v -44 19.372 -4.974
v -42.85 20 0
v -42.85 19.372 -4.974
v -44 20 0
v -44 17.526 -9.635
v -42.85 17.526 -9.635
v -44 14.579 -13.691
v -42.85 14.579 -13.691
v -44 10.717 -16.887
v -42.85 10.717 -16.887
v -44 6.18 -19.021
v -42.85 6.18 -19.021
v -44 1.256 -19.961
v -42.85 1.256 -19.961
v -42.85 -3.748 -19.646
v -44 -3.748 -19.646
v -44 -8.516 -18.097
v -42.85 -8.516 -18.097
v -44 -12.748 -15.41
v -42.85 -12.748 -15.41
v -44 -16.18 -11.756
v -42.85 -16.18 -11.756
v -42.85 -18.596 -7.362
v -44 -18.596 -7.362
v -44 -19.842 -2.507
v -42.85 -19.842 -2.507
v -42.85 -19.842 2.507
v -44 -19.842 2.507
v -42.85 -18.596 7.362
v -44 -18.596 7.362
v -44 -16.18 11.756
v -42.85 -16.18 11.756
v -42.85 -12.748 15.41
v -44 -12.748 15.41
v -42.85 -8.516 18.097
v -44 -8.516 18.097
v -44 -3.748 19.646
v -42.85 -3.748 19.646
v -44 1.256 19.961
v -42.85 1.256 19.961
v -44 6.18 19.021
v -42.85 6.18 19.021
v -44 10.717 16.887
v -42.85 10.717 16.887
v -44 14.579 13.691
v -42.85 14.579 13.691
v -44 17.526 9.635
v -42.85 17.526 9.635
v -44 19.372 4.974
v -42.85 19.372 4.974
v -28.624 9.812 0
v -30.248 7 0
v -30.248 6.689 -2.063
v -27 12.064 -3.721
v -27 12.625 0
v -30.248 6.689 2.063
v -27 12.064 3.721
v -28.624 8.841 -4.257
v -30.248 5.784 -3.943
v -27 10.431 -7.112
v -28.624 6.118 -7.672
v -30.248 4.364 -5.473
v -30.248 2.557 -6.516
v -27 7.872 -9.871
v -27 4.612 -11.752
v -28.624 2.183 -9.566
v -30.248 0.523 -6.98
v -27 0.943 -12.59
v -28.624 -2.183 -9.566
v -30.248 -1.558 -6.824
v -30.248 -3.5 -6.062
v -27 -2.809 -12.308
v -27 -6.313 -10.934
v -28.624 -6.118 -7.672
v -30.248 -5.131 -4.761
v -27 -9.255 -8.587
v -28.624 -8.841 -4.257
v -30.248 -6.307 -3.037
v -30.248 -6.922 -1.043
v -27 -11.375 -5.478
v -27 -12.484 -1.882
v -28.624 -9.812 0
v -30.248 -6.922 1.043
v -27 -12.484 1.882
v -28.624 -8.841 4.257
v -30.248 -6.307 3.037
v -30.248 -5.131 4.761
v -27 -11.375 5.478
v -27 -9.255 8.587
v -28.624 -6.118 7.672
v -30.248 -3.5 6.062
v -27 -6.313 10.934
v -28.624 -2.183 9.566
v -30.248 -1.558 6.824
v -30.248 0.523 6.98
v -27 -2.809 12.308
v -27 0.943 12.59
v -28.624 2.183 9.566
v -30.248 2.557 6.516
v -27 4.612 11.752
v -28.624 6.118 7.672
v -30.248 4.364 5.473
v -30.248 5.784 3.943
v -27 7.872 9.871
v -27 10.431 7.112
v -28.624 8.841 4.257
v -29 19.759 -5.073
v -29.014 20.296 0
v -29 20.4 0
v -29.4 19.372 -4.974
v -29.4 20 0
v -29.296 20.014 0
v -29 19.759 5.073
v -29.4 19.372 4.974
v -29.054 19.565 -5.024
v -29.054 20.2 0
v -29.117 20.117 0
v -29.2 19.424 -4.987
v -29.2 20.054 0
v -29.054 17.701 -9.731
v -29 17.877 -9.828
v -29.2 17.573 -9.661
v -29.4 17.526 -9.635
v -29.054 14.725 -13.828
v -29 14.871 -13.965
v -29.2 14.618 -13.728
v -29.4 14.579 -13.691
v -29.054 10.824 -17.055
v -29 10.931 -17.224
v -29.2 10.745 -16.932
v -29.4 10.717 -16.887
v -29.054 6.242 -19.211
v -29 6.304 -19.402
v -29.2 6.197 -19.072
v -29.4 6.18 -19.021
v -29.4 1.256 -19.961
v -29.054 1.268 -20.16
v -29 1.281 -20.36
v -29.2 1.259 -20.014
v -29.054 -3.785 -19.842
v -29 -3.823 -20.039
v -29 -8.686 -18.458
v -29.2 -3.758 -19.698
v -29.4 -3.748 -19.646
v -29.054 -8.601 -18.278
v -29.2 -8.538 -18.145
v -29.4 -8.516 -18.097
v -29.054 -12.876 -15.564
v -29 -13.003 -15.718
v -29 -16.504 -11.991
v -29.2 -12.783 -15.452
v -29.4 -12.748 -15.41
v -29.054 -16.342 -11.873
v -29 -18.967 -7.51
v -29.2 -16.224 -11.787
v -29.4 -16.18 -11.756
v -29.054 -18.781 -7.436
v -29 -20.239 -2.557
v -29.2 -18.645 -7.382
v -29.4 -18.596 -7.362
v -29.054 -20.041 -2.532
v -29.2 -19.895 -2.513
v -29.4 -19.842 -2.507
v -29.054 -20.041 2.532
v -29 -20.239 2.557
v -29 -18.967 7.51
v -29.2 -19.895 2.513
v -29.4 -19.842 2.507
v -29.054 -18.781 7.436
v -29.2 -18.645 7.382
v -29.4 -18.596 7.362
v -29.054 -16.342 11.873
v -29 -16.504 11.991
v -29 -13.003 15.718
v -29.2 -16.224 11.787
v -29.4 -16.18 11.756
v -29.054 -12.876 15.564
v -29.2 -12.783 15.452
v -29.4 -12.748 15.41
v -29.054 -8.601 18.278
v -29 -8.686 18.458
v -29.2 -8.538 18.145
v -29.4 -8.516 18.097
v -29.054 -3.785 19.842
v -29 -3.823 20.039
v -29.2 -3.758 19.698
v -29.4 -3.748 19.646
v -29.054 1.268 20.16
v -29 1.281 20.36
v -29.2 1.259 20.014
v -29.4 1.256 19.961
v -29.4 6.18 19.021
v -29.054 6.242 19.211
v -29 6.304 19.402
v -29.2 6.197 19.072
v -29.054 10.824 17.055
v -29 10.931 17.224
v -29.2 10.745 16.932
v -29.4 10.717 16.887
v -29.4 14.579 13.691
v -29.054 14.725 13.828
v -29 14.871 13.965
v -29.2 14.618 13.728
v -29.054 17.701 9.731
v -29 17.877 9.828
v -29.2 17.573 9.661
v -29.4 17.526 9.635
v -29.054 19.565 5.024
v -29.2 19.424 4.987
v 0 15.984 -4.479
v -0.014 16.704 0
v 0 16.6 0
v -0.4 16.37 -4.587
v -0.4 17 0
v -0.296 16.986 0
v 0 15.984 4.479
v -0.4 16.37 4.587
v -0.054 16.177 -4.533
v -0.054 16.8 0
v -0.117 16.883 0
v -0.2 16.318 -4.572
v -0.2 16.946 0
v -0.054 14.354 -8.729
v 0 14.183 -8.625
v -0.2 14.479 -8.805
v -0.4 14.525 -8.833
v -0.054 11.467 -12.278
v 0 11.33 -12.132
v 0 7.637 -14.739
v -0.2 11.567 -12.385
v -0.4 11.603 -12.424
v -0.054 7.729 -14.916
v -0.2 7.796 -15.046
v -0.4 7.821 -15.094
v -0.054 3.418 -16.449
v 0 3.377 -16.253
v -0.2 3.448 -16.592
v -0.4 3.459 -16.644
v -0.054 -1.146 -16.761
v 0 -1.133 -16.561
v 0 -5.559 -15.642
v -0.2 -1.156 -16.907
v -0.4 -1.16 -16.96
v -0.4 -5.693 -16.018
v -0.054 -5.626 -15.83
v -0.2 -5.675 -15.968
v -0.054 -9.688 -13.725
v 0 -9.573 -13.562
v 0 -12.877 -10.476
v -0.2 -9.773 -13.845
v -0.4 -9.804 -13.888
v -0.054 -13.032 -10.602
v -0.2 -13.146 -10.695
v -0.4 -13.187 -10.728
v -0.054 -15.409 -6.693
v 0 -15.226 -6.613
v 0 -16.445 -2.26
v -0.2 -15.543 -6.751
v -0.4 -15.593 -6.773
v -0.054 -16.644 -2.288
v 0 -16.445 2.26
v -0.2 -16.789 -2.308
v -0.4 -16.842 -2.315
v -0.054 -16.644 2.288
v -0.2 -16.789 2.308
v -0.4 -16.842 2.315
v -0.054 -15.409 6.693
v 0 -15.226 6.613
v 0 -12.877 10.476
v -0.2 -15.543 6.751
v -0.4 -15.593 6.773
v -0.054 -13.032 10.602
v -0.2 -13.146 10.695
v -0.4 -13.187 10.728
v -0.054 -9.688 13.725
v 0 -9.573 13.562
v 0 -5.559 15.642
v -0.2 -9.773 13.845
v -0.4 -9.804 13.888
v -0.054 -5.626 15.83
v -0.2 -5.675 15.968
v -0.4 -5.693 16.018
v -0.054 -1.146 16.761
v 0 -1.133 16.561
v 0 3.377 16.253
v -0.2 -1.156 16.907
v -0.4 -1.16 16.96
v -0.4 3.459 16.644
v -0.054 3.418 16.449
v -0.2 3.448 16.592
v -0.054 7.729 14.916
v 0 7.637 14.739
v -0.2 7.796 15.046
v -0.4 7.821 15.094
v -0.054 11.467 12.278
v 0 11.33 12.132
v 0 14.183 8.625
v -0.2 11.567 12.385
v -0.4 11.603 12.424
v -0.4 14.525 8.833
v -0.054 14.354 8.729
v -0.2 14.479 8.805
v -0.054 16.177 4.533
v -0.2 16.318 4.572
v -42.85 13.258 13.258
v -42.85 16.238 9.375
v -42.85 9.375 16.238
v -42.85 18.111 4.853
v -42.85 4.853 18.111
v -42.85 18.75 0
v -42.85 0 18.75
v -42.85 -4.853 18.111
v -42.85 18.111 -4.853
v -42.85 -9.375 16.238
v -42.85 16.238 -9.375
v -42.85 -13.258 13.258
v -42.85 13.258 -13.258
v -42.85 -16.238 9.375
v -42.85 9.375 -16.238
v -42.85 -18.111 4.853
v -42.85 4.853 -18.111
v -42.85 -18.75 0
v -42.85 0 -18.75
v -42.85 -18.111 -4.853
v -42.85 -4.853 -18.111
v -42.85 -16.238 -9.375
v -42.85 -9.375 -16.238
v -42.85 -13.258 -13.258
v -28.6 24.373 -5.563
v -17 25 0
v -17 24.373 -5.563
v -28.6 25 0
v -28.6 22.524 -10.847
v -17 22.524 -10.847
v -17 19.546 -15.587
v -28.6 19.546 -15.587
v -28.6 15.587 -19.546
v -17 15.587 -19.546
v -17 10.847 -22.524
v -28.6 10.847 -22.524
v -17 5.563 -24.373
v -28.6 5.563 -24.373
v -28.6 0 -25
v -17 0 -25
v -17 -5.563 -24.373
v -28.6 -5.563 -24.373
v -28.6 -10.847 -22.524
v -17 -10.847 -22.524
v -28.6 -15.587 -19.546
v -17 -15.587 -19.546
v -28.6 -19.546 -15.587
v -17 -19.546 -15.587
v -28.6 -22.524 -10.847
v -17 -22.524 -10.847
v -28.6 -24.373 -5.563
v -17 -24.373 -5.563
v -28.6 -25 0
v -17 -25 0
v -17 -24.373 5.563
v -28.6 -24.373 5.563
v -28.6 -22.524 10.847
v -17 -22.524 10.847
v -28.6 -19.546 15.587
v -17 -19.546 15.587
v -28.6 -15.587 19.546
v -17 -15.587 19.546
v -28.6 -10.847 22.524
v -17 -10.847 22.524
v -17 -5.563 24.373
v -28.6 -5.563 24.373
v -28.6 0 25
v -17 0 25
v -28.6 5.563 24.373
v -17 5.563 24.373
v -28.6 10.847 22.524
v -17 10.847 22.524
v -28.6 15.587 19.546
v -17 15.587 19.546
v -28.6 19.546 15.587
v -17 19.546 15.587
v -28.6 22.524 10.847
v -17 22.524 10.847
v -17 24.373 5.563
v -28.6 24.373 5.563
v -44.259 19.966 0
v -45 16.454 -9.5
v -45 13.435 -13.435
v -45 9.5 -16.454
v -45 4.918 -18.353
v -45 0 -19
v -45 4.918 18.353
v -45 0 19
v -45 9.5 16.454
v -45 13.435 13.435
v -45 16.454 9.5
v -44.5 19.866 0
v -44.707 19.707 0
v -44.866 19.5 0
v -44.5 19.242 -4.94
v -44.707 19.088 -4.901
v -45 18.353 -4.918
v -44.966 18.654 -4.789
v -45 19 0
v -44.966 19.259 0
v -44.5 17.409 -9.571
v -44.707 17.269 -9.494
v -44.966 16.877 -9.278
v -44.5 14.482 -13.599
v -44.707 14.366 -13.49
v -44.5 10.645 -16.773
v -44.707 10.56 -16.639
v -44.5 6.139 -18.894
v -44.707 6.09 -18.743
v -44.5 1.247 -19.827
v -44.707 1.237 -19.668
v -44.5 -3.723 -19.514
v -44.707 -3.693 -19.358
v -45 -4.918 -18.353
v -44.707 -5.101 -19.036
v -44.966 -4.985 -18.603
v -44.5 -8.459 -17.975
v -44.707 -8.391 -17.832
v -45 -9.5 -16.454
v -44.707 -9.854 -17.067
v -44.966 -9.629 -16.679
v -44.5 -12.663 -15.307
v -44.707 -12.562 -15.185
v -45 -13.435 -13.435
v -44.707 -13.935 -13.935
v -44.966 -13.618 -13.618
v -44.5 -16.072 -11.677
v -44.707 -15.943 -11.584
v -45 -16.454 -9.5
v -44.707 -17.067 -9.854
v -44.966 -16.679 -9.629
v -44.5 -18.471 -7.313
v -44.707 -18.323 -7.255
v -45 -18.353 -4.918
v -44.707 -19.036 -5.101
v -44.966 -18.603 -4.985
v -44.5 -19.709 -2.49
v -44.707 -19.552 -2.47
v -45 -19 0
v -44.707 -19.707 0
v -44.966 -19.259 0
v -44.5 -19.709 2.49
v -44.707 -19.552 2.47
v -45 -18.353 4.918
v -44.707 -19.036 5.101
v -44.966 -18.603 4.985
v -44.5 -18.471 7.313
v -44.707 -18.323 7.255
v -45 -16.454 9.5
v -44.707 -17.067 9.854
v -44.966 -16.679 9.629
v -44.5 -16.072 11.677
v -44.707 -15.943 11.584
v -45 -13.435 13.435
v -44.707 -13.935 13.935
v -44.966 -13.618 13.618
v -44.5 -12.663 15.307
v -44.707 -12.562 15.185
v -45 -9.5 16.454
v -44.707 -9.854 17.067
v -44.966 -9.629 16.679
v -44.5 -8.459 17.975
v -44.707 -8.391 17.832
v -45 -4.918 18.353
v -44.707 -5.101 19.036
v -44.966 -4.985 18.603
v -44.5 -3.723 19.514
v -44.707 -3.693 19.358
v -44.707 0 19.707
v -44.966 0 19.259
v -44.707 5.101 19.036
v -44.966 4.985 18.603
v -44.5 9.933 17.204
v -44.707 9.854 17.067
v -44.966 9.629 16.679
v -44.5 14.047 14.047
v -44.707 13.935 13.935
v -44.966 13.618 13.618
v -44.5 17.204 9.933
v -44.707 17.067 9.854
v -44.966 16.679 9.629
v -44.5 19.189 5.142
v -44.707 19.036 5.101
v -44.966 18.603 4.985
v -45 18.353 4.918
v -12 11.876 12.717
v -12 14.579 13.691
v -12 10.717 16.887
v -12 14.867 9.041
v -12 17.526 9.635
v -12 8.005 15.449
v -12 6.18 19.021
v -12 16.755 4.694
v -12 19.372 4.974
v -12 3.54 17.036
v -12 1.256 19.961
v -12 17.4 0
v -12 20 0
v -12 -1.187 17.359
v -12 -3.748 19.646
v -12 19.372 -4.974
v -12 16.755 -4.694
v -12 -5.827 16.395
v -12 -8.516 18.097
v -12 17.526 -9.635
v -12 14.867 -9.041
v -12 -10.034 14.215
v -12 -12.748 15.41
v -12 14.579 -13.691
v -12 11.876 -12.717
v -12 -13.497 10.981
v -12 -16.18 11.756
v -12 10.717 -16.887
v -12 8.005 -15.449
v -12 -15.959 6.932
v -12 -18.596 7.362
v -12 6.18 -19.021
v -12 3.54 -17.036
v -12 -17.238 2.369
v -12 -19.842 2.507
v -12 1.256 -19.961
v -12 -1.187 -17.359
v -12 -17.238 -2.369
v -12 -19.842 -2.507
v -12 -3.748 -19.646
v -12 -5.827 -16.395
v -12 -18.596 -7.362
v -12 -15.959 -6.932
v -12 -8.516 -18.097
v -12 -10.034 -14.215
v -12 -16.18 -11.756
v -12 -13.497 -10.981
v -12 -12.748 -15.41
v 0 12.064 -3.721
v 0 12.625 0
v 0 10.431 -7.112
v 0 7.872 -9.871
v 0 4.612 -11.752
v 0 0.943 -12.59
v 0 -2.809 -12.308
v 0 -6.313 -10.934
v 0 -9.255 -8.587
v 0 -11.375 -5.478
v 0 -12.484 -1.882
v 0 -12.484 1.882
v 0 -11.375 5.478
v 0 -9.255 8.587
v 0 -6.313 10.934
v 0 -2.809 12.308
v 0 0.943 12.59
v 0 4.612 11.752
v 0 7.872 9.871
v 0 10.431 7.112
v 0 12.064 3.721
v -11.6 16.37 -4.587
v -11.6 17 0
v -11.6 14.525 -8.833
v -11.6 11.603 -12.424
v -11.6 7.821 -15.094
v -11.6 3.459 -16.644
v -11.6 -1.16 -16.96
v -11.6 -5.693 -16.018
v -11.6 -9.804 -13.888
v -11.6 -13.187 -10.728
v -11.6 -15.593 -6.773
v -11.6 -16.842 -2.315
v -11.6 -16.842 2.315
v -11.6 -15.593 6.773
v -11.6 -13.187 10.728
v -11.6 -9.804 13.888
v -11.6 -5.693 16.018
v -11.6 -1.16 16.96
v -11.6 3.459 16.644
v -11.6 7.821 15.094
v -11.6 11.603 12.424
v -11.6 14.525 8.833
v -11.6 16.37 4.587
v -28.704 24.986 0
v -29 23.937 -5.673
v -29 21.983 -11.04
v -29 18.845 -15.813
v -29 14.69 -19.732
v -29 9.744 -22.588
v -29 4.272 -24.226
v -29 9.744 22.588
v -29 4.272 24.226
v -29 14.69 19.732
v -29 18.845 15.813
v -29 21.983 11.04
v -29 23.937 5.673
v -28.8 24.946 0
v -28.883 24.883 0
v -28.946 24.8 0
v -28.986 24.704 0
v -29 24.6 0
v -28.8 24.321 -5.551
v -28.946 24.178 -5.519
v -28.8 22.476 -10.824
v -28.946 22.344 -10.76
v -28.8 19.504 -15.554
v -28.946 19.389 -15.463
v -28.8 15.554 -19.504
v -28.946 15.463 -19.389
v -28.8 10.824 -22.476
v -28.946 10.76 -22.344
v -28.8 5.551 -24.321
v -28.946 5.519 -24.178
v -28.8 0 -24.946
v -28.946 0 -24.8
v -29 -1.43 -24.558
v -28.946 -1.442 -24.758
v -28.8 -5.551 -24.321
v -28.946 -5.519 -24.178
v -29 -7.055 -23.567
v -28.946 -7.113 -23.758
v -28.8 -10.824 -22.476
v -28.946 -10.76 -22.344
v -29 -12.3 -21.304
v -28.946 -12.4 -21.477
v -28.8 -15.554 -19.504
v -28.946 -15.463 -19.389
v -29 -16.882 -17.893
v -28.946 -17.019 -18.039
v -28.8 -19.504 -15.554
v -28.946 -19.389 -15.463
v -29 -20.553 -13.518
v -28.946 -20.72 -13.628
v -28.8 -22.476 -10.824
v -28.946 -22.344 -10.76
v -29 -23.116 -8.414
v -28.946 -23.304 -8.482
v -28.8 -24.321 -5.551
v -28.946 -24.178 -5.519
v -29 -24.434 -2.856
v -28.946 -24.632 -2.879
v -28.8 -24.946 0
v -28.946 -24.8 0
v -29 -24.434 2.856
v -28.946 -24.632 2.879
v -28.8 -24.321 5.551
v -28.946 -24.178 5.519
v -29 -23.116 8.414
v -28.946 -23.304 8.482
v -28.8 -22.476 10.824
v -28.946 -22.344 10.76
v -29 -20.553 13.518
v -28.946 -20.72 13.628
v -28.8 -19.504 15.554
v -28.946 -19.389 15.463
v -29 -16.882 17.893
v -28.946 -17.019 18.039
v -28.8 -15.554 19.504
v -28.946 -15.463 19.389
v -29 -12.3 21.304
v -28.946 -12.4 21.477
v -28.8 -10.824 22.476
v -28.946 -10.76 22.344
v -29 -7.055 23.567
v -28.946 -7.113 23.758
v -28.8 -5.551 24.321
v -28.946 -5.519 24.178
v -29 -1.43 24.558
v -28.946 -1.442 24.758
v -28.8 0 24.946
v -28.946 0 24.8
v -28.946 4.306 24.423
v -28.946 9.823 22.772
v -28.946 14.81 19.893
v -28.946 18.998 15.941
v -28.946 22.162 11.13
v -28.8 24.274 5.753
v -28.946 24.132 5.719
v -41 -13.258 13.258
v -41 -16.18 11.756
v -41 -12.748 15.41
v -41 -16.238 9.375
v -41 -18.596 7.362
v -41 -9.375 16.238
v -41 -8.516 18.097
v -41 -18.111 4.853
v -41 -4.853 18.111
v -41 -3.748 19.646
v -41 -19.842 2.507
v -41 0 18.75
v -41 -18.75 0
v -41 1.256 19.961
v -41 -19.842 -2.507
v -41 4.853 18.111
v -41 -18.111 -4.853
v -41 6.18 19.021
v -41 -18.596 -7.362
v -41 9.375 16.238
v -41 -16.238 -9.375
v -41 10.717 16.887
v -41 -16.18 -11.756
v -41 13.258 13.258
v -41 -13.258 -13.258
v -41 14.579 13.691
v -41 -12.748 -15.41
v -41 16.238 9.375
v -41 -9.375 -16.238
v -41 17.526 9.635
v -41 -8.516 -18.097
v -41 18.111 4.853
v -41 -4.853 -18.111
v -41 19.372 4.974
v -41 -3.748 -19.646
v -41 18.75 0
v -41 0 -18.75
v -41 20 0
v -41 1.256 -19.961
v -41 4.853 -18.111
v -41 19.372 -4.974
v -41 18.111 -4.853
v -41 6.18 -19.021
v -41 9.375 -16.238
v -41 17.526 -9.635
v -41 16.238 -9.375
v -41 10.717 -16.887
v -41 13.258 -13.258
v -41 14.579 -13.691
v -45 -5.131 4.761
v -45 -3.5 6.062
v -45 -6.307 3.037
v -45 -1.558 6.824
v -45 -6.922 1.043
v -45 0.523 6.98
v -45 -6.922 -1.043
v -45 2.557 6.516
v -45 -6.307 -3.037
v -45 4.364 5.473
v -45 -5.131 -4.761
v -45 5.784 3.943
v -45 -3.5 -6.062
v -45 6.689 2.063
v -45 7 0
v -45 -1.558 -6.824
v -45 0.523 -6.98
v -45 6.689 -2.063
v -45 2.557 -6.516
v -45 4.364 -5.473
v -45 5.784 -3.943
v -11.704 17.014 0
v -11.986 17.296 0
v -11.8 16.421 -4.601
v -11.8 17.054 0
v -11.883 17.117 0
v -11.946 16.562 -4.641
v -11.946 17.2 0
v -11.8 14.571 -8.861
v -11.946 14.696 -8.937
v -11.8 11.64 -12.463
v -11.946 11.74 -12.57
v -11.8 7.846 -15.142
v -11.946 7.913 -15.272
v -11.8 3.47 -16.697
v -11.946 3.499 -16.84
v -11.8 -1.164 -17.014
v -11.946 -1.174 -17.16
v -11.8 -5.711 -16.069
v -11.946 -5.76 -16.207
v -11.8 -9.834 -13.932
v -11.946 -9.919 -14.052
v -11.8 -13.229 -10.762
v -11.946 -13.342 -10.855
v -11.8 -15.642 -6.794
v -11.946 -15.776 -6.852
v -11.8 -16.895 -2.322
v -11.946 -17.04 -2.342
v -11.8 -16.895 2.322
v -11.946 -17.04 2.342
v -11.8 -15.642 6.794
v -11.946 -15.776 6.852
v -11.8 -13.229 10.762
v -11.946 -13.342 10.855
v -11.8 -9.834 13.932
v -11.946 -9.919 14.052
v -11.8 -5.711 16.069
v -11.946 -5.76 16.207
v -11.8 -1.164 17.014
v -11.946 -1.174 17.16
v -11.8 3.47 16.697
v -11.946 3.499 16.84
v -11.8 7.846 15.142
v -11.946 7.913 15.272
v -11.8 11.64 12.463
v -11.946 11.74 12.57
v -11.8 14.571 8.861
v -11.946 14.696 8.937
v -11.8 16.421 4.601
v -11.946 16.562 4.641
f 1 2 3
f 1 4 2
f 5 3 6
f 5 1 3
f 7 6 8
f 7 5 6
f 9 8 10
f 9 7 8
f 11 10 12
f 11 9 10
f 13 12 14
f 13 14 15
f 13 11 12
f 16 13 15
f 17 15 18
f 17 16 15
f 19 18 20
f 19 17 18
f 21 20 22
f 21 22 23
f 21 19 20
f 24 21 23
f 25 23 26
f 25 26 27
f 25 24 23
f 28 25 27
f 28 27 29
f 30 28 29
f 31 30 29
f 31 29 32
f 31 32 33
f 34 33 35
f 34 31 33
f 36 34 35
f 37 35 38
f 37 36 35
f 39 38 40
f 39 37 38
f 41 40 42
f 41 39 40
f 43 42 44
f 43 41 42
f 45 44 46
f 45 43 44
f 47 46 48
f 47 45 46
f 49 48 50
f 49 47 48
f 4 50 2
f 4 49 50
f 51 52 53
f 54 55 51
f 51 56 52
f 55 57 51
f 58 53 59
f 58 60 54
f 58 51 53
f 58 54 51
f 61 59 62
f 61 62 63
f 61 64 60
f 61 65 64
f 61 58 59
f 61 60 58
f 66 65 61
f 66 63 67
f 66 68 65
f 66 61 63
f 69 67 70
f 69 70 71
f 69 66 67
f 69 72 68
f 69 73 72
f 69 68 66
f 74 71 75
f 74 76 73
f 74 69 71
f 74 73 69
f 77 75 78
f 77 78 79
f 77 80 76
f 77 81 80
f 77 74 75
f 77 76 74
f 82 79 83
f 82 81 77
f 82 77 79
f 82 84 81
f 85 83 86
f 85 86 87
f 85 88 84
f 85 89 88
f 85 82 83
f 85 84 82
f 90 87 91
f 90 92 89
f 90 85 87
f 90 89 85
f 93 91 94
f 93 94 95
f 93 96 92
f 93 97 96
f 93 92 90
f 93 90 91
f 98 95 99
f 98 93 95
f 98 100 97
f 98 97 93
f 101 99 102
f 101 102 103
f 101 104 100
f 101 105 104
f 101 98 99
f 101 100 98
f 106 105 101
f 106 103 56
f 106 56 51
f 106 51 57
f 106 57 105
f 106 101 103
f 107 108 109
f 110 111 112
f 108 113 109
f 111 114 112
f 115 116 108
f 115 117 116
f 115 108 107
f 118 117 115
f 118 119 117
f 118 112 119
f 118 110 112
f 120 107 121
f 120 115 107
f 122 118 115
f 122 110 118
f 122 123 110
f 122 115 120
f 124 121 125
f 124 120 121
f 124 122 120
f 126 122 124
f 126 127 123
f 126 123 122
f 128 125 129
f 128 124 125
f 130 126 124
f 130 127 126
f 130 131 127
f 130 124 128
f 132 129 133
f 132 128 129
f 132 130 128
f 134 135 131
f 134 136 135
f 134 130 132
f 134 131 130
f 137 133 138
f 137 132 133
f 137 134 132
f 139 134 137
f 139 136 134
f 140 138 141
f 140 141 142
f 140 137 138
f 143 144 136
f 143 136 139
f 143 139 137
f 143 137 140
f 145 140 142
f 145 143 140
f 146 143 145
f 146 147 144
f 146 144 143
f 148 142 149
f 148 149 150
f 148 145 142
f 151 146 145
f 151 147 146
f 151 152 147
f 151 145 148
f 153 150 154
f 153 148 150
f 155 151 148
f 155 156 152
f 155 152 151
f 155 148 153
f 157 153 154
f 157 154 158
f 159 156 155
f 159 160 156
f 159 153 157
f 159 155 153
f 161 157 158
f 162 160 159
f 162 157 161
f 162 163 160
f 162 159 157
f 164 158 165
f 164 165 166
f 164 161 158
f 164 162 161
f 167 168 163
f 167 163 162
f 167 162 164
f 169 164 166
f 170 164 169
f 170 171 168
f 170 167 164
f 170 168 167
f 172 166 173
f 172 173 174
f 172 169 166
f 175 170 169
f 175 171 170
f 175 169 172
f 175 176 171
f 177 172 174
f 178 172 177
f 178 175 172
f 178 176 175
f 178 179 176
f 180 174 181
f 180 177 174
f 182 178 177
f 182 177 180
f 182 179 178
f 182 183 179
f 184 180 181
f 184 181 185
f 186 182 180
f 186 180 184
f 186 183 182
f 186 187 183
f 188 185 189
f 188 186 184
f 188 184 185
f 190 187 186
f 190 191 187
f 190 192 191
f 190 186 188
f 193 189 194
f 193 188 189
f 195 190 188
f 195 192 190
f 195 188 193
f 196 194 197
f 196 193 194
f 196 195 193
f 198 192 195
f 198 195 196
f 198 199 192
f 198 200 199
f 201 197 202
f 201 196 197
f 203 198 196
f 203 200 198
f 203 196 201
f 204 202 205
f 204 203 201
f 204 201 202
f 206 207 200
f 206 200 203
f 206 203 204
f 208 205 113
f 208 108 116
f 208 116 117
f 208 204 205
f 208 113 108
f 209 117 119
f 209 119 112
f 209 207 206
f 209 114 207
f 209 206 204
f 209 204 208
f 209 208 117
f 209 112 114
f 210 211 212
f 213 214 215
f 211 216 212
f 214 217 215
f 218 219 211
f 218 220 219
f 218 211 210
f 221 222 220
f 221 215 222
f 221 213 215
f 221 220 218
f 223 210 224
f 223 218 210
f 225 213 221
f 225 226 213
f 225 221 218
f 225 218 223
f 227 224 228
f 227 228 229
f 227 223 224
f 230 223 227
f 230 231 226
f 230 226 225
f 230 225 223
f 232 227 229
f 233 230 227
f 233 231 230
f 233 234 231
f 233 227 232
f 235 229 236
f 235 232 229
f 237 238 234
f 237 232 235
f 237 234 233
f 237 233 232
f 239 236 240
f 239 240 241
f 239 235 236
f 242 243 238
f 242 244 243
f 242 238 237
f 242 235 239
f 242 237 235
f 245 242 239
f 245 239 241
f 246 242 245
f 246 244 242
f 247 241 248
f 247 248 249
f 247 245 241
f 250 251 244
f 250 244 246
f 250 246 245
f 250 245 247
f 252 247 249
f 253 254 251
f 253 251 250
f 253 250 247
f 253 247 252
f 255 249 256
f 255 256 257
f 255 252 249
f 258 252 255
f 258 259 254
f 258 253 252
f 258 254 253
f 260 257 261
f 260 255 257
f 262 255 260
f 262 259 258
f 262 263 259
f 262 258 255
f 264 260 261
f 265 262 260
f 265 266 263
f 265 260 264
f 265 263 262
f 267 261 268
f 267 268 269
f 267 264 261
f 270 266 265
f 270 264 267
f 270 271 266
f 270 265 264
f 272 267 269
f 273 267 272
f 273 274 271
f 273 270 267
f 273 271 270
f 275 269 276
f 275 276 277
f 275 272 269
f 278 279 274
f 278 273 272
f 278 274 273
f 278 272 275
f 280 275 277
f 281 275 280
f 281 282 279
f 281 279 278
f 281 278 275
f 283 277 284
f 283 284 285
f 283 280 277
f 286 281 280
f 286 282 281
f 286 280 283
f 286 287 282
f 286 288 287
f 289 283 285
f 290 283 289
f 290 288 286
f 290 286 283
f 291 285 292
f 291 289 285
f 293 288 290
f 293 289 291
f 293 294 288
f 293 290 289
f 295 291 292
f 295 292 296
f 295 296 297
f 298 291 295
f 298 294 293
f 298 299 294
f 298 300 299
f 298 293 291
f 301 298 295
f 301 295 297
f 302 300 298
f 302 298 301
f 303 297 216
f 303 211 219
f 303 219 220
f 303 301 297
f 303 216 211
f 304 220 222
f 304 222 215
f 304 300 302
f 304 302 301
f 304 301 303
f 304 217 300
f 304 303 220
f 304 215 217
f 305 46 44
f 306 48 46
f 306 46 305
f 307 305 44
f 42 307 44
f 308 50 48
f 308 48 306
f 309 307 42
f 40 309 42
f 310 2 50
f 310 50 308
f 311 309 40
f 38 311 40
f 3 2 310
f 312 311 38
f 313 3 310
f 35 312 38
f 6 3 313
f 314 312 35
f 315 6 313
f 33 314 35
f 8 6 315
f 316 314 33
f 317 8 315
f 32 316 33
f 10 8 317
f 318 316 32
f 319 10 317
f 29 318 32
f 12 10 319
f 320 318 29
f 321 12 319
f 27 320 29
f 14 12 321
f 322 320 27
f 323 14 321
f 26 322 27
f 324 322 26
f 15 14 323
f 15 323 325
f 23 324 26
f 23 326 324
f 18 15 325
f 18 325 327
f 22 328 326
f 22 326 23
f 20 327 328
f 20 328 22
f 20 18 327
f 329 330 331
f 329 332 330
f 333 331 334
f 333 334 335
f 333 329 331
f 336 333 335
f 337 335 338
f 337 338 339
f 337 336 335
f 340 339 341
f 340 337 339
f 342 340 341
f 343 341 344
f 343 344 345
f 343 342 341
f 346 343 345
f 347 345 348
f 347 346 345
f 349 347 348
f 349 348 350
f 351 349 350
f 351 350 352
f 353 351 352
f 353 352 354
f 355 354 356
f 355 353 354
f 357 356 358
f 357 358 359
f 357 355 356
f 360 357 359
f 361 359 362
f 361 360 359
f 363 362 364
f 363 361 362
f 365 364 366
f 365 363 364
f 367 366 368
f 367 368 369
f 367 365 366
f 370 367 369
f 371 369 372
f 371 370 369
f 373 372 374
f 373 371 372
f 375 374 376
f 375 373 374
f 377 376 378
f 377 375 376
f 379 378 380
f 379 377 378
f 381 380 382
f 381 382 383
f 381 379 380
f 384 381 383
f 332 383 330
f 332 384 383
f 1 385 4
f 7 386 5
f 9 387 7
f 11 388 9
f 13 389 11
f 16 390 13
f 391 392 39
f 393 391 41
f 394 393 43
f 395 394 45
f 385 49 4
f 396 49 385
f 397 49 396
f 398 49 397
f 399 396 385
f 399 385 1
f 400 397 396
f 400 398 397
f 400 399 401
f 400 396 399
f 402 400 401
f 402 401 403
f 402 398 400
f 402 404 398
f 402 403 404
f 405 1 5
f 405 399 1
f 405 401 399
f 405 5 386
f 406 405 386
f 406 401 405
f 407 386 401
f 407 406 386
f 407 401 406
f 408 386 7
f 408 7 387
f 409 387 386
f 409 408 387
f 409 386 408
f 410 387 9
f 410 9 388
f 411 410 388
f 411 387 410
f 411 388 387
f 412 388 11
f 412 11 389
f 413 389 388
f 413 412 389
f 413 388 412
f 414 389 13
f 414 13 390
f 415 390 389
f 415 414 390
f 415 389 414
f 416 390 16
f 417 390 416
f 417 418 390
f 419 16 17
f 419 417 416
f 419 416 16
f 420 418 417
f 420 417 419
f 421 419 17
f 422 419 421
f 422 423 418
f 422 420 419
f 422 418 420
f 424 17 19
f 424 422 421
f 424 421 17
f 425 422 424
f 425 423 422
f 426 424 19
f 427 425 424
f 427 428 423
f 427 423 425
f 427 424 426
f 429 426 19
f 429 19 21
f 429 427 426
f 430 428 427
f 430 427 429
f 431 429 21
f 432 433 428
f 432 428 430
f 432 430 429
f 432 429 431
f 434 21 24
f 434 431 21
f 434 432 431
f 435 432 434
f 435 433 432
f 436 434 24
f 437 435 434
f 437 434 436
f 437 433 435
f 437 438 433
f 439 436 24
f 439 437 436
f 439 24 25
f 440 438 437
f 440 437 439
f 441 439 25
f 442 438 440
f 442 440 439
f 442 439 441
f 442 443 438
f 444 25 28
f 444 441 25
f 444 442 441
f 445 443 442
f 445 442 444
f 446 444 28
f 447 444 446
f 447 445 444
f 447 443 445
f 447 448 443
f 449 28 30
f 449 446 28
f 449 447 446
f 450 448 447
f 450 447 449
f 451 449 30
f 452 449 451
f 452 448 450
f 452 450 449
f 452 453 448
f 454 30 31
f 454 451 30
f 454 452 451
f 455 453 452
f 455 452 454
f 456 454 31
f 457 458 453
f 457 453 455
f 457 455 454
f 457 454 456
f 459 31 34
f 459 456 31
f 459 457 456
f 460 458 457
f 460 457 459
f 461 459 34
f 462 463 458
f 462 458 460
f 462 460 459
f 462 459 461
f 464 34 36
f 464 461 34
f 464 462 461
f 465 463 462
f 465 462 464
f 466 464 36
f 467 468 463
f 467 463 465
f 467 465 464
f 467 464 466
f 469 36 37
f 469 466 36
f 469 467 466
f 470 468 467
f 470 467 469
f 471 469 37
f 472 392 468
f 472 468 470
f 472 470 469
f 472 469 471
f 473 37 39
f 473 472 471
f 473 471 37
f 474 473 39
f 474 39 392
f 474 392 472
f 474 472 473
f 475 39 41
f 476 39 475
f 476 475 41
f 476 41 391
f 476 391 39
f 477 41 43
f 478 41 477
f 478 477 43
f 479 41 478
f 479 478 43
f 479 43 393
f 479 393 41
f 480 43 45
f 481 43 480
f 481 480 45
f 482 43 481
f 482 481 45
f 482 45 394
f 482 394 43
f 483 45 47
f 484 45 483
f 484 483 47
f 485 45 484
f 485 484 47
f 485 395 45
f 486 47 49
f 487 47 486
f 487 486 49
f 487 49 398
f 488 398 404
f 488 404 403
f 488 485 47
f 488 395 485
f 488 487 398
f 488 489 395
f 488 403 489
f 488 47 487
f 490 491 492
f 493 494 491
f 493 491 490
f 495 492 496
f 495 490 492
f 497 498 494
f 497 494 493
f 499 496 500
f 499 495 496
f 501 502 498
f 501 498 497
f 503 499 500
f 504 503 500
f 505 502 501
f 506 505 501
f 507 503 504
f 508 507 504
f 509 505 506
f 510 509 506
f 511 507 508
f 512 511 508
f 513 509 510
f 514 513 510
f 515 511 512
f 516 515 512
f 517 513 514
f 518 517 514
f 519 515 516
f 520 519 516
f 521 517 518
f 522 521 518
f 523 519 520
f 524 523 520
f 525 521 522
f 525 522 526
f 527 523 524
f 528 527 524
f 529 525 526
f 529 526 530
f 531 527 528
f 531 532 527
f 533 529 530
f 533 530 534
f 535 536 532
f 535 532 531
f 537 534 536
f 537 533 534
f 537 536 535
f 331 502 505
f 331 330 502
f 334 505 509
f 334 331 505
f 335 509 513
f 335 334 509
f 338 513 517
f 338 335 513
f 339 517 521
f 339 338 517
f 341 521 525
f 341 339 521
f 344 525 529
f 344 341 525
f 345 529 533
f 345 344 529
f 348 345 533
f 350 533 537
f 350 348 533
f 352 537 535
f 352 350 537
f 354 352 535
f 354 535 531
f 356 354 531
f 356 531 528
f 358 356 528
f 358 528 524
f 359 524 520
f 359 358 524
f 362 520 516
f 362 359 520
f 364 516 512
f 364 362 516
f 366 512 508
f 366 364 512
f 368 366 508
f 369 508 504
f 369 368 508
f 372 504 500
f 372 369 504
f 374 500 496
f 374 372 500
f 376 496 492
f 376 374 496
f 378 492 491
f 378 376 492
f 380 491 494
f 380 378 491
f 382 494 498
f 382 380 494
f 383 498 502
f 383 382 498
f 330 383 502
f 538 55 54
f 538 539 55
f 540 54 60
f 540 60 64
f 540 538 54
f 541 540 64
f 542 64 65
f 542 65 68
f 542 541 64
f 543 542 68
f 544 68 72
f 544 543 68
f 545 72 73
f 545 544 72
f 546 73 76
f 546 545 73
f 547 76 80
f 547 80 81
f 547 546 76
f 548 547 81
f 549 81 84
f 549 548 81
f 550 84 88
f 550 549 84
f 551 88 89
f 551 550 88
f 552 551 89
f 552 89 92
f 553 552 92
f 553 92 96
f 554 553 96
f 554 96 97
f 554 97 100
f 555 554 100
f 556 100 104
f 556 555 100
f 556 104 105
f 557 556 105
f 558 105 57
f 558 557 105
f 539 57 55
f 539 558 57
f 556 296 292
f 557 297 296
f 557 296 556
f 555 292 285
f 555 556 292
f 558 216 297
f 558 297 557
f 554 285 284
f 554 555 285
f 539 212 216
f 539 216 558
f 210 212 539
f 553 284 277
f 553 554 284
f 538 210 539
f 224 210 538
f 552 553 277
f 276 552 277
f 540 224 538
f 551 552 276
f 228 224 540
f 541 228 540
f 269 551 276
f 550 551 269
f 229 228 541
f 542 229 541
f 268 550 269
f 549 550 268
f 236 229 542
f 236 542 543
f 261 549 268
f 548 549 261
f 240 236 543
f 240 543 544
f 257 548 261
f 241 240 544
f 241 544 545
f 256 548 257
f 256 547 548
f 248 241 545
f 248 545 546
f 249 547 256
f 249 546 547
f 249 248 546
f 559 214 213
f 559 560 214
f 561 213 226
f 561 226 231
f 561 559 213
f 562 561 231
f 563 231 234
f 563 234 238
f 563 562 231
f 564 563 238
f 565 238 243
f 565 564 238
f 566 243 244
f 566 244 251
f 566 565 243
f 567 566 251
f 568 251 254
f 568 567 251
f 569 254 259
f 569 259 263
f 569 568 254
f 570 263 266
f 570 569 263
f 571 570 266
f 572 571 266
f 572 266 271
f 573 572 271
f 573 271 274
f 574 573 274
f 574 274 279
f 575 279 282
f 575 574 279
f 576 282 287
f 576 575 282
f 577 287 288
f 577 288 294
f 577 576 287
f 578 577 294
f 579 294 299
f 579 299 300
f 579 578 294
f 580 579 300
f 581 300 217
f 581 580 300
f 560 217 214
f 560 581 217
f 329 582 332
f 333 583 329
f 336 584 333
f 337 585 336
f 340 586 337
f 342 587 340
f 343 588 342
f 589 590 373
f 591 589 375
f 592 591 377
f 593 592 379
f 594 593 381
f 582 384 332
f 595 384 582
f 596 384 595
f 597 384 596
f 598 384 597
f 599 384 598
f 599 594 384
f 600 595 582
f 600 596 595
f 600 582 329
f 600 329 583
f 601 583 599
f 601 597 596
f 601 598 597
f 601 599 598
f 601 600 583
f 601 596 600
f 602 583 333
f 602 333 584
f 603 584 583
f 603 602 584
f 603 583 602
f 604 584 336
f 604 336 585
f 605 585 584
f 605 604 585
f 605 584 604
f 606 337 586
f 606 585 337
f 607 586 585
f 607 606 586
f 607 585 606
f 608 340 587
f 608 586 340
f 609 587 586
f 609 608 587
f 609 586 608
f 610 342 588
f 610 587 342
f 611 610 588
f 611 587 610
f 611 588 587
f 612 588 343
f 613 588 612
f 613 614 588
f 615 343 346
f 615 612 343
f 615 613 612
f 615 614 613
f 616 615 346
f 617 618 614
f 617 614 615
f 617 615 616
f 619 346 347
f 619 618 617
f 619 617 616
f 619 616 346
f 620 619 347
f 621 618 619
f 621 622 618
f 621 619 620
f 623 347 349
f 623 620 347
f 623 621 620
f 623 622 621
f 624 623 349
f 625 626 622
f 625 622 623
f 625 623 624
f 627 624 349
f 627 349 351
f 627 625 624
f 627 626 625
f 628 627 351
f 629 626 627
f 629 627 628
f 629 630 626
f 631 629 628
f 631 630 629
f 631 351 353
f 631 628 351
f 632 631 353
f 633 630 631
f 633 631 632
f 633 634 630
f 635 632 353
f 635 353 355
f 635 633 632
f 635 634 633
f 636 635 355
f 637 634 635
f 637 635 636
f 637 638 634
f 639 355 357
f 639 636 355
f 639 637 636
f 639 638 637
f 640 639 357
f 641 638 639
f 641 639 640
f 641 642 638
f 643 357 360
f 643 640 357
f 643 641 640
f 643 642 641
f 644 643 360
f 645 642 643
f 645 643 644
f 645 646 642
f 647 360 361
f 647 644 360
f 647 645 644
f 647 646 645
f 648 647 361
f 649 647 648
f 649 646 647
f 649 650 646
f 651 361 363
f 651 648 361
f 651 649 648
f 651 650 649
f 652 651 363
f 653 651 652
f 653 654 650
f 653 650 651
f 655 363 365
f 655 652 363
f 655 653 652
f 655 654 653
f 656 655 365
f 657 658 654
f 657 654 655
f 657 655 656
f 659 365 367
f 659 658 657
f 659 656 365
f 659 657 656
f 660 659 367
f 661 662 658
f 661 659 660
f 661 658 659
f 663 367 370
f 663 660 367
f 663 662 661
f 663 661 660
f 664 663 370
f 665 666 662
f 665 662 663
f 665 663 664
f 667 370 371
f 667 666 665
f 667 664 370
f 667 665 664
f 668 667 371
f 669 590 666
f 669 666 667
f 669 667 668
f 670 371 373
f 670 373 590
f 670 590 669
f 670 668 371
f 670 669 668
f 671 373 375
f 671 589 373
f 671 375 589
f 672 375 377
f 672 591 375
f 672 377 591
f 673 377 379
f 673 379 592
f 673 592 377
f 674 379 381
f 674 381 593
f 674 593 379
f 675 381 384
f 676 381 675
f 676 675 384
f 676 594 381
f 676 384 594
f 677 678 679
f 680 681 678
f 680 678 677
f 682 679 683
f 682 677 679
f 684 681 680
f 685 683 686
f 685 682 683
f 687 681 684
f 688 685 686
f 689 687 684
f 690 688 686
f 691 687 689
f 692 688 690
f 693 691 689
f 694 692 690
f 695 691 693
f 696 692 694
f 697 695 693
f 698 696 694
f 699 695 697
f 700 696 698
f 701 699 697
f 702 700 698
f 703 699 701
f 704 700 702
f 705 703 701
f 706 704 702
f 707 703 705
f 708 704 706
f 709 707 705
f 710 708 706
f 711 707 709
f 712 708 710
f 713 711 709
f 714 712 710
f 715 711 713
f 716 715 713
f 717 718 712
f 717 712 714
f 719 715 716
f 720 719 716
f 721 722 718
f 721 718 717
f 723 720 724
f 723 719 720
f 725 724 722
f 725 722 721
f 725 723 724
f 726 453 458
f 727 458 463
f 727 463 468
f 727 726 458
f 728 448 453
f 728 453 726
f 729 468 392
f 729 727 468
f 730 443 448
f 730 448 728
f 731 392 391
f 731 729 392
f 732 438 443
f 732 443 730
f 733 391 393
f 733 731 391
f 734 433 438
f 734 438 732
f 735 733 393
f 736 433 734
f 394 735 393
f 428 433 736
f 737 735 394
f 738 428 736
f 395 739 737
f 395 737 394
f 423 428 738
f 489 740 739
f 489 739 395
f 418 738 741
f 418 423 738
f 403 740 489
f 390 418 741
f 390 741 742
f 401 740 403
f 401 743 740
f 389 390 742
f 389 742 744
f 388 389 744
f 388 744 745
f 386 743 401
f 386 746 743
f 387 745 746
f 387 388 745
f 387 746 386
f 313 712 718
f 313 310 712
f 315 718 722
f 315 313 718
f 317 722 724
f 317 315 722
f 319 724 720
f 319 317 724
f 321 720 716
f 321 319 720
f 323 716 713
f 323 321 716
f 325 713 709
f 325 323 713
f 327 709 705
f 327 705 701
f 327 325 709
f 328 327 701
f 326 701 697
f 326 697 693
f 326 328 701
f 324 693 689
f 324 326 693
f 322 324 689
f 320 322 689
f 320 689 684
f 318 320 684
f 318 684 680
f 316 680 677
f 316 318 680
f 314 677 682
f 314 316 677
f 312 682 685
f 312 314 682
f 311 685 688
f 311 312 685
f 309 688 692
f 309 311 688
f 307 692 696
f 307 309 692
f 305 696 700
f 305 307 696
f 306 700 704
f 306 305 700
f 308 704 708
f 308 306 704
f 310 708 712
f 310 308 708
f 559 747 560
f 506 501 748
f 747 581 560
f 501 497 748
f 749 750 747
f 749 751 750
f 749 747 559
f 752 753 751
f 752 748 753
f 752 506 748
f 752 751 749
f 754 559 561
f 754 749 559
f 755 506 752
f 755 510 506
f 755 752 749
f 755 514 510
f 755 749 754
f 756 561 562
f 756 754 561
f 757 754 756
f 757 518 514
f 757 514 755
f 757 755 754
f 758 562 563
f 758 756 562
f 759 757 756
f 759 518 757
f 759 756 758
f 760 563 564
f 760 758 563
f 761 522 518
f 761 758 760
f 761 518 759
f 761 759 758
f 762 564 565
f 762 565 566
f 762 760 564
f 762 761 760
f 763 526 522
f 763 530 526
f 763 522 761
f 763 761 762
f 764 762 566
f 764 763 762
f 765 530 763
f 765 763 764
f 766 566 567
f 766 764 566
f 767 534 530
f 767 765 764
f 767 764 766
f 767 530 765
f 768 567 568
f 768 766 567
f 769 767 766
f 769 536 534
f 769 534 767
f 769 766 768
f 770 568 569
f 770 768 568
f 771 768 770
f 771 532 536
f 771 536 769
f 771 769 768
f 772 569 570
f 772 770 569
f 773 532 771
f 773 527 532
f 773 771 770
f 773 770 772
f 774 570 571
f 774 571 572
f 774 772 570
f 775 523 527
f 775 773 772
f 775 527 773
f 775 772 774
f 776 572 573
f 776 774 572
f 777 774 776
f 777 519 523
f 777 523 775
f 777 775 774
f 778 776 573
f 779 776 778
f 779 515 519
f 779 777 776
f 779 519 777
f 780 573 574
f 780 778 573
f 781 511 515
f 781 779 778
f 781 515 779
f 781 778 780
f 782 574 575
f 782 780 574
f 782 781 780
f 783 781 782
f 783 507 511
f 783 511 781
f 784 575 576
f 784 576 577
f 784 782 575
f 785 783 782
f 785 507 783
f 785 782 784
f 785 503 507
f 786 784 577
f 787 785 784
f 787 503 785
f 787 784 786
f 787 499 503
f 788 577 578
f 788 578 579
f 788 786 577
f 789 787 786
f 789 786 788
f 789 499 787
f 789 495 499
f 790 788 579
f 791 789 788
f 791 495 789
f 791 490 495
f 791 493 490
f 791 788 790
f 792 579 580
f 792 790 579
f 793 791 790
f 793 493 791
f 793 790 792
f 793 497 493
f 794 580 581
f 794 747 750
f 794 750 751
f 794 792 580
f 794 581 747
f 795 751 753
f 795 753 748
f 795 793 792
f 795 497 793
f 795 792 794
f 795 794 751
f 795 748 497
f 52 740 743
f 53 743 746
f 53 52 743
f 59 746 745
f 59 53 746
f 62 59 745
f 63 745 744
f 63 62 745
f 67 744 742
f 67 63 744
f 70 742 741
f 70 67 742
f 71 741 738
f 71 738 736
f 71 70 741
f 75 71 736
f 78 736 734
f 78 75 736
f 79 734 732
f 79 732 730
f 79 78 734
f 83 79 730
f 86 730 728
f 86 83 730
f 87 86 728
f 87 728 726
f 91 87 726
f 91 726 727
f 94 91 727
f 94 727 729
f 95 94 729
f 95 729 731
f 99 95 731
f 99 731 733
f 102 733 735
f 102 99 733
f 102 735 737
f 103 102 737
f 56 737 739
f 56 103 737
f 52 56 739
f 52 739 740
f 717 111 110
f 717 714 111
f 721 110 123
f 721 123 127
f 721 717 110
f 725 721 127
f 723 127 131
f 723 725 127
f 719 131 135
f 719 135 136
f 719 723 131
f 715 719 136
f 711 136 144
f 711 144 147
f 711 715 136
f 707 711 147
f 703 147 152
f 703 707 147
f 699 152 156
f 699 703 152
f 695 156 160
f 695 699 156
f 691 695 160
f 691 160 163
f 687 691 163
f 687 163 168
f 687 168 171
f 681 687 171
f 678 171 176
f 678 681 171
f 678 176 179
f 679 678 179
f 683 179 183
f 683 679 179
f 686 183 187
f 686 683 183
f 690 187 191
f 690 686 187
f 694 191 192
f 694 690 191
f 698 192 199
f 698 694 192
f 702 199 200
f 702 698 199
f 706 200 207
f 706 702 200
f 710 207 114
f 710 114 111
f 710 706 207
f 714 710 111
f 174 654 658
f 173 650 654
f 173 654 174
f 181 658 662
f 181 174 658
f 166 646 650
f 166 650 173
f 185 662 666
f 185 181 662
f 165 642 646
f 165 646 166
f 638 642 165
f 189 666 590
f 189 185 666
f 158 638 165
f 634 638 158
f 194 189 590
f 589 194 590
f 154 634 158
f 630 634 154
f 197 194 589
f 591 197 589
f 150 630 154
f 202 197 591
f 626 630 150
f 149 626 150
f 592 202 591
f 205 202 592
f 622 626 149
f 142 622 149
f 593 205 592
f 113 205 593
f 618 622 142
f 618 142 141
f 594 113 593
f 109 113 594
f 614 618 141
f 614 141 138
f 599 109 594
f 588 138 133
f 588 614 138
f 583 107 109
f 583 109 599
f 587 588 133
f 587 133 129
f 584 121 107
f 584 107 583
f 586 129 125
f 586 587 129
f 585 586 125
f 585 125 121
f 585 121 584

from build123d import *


with BuildPart() as part:
    # Sketch1 → Base-Revolve (revolve)
    with BuildSketch(Plane.XY):
        with BuildLine():
            Line((0, 12.625), (0, 16.6))
            ThreePointArc((0, 16.6), (-0.117157288, 16.882842712), (-0.4, 17))
            Line((-0.4, 17), (-11.6, 17))
            ThreePointArc((-11.6, 17), (-11.882842712, 17.117157288), (-12, 17.4))
            Line((-12, 17.4), (-12, 20))
            Line((-12, 20), (-17, 25))
            Line((-17, 25), (-28.6, 25))
            ThreePointArc((-28.6, 25), (-28.882842712, 24.882842712), (-29, 24.6))
            Line((-29, 24.6), (-29, 20.4))
            ThreePointArc((-29, 20.4), (-29.117157288, 20.117157288), (-29.4, 20))
            Line((-29.4, 20), (-41, 20))
            Line((-41, 20), (-41, 18.75))
            Line((-41, 18.75), (-42.85, 18.75))
            Line((-42.85, 18.75), (-42.85, 20))
            Line((-42.85, 20), (-44, 20))
            ThreePointArc((-44, 20), (-44.707106781, 19.707106781), (-45, 19))
            Line((-45, 19), (-45, 7))
            Line((-45, 7), (-30.247595264, 7))
            Line((-30.247595264, 7), (-27, 12.625))
            Line((-27, 12.625), (0, 12.625))
        make_face()
    revolve(axis=Axis((0, 0, 0), (-1, 0, 0)))


solid = part.part
